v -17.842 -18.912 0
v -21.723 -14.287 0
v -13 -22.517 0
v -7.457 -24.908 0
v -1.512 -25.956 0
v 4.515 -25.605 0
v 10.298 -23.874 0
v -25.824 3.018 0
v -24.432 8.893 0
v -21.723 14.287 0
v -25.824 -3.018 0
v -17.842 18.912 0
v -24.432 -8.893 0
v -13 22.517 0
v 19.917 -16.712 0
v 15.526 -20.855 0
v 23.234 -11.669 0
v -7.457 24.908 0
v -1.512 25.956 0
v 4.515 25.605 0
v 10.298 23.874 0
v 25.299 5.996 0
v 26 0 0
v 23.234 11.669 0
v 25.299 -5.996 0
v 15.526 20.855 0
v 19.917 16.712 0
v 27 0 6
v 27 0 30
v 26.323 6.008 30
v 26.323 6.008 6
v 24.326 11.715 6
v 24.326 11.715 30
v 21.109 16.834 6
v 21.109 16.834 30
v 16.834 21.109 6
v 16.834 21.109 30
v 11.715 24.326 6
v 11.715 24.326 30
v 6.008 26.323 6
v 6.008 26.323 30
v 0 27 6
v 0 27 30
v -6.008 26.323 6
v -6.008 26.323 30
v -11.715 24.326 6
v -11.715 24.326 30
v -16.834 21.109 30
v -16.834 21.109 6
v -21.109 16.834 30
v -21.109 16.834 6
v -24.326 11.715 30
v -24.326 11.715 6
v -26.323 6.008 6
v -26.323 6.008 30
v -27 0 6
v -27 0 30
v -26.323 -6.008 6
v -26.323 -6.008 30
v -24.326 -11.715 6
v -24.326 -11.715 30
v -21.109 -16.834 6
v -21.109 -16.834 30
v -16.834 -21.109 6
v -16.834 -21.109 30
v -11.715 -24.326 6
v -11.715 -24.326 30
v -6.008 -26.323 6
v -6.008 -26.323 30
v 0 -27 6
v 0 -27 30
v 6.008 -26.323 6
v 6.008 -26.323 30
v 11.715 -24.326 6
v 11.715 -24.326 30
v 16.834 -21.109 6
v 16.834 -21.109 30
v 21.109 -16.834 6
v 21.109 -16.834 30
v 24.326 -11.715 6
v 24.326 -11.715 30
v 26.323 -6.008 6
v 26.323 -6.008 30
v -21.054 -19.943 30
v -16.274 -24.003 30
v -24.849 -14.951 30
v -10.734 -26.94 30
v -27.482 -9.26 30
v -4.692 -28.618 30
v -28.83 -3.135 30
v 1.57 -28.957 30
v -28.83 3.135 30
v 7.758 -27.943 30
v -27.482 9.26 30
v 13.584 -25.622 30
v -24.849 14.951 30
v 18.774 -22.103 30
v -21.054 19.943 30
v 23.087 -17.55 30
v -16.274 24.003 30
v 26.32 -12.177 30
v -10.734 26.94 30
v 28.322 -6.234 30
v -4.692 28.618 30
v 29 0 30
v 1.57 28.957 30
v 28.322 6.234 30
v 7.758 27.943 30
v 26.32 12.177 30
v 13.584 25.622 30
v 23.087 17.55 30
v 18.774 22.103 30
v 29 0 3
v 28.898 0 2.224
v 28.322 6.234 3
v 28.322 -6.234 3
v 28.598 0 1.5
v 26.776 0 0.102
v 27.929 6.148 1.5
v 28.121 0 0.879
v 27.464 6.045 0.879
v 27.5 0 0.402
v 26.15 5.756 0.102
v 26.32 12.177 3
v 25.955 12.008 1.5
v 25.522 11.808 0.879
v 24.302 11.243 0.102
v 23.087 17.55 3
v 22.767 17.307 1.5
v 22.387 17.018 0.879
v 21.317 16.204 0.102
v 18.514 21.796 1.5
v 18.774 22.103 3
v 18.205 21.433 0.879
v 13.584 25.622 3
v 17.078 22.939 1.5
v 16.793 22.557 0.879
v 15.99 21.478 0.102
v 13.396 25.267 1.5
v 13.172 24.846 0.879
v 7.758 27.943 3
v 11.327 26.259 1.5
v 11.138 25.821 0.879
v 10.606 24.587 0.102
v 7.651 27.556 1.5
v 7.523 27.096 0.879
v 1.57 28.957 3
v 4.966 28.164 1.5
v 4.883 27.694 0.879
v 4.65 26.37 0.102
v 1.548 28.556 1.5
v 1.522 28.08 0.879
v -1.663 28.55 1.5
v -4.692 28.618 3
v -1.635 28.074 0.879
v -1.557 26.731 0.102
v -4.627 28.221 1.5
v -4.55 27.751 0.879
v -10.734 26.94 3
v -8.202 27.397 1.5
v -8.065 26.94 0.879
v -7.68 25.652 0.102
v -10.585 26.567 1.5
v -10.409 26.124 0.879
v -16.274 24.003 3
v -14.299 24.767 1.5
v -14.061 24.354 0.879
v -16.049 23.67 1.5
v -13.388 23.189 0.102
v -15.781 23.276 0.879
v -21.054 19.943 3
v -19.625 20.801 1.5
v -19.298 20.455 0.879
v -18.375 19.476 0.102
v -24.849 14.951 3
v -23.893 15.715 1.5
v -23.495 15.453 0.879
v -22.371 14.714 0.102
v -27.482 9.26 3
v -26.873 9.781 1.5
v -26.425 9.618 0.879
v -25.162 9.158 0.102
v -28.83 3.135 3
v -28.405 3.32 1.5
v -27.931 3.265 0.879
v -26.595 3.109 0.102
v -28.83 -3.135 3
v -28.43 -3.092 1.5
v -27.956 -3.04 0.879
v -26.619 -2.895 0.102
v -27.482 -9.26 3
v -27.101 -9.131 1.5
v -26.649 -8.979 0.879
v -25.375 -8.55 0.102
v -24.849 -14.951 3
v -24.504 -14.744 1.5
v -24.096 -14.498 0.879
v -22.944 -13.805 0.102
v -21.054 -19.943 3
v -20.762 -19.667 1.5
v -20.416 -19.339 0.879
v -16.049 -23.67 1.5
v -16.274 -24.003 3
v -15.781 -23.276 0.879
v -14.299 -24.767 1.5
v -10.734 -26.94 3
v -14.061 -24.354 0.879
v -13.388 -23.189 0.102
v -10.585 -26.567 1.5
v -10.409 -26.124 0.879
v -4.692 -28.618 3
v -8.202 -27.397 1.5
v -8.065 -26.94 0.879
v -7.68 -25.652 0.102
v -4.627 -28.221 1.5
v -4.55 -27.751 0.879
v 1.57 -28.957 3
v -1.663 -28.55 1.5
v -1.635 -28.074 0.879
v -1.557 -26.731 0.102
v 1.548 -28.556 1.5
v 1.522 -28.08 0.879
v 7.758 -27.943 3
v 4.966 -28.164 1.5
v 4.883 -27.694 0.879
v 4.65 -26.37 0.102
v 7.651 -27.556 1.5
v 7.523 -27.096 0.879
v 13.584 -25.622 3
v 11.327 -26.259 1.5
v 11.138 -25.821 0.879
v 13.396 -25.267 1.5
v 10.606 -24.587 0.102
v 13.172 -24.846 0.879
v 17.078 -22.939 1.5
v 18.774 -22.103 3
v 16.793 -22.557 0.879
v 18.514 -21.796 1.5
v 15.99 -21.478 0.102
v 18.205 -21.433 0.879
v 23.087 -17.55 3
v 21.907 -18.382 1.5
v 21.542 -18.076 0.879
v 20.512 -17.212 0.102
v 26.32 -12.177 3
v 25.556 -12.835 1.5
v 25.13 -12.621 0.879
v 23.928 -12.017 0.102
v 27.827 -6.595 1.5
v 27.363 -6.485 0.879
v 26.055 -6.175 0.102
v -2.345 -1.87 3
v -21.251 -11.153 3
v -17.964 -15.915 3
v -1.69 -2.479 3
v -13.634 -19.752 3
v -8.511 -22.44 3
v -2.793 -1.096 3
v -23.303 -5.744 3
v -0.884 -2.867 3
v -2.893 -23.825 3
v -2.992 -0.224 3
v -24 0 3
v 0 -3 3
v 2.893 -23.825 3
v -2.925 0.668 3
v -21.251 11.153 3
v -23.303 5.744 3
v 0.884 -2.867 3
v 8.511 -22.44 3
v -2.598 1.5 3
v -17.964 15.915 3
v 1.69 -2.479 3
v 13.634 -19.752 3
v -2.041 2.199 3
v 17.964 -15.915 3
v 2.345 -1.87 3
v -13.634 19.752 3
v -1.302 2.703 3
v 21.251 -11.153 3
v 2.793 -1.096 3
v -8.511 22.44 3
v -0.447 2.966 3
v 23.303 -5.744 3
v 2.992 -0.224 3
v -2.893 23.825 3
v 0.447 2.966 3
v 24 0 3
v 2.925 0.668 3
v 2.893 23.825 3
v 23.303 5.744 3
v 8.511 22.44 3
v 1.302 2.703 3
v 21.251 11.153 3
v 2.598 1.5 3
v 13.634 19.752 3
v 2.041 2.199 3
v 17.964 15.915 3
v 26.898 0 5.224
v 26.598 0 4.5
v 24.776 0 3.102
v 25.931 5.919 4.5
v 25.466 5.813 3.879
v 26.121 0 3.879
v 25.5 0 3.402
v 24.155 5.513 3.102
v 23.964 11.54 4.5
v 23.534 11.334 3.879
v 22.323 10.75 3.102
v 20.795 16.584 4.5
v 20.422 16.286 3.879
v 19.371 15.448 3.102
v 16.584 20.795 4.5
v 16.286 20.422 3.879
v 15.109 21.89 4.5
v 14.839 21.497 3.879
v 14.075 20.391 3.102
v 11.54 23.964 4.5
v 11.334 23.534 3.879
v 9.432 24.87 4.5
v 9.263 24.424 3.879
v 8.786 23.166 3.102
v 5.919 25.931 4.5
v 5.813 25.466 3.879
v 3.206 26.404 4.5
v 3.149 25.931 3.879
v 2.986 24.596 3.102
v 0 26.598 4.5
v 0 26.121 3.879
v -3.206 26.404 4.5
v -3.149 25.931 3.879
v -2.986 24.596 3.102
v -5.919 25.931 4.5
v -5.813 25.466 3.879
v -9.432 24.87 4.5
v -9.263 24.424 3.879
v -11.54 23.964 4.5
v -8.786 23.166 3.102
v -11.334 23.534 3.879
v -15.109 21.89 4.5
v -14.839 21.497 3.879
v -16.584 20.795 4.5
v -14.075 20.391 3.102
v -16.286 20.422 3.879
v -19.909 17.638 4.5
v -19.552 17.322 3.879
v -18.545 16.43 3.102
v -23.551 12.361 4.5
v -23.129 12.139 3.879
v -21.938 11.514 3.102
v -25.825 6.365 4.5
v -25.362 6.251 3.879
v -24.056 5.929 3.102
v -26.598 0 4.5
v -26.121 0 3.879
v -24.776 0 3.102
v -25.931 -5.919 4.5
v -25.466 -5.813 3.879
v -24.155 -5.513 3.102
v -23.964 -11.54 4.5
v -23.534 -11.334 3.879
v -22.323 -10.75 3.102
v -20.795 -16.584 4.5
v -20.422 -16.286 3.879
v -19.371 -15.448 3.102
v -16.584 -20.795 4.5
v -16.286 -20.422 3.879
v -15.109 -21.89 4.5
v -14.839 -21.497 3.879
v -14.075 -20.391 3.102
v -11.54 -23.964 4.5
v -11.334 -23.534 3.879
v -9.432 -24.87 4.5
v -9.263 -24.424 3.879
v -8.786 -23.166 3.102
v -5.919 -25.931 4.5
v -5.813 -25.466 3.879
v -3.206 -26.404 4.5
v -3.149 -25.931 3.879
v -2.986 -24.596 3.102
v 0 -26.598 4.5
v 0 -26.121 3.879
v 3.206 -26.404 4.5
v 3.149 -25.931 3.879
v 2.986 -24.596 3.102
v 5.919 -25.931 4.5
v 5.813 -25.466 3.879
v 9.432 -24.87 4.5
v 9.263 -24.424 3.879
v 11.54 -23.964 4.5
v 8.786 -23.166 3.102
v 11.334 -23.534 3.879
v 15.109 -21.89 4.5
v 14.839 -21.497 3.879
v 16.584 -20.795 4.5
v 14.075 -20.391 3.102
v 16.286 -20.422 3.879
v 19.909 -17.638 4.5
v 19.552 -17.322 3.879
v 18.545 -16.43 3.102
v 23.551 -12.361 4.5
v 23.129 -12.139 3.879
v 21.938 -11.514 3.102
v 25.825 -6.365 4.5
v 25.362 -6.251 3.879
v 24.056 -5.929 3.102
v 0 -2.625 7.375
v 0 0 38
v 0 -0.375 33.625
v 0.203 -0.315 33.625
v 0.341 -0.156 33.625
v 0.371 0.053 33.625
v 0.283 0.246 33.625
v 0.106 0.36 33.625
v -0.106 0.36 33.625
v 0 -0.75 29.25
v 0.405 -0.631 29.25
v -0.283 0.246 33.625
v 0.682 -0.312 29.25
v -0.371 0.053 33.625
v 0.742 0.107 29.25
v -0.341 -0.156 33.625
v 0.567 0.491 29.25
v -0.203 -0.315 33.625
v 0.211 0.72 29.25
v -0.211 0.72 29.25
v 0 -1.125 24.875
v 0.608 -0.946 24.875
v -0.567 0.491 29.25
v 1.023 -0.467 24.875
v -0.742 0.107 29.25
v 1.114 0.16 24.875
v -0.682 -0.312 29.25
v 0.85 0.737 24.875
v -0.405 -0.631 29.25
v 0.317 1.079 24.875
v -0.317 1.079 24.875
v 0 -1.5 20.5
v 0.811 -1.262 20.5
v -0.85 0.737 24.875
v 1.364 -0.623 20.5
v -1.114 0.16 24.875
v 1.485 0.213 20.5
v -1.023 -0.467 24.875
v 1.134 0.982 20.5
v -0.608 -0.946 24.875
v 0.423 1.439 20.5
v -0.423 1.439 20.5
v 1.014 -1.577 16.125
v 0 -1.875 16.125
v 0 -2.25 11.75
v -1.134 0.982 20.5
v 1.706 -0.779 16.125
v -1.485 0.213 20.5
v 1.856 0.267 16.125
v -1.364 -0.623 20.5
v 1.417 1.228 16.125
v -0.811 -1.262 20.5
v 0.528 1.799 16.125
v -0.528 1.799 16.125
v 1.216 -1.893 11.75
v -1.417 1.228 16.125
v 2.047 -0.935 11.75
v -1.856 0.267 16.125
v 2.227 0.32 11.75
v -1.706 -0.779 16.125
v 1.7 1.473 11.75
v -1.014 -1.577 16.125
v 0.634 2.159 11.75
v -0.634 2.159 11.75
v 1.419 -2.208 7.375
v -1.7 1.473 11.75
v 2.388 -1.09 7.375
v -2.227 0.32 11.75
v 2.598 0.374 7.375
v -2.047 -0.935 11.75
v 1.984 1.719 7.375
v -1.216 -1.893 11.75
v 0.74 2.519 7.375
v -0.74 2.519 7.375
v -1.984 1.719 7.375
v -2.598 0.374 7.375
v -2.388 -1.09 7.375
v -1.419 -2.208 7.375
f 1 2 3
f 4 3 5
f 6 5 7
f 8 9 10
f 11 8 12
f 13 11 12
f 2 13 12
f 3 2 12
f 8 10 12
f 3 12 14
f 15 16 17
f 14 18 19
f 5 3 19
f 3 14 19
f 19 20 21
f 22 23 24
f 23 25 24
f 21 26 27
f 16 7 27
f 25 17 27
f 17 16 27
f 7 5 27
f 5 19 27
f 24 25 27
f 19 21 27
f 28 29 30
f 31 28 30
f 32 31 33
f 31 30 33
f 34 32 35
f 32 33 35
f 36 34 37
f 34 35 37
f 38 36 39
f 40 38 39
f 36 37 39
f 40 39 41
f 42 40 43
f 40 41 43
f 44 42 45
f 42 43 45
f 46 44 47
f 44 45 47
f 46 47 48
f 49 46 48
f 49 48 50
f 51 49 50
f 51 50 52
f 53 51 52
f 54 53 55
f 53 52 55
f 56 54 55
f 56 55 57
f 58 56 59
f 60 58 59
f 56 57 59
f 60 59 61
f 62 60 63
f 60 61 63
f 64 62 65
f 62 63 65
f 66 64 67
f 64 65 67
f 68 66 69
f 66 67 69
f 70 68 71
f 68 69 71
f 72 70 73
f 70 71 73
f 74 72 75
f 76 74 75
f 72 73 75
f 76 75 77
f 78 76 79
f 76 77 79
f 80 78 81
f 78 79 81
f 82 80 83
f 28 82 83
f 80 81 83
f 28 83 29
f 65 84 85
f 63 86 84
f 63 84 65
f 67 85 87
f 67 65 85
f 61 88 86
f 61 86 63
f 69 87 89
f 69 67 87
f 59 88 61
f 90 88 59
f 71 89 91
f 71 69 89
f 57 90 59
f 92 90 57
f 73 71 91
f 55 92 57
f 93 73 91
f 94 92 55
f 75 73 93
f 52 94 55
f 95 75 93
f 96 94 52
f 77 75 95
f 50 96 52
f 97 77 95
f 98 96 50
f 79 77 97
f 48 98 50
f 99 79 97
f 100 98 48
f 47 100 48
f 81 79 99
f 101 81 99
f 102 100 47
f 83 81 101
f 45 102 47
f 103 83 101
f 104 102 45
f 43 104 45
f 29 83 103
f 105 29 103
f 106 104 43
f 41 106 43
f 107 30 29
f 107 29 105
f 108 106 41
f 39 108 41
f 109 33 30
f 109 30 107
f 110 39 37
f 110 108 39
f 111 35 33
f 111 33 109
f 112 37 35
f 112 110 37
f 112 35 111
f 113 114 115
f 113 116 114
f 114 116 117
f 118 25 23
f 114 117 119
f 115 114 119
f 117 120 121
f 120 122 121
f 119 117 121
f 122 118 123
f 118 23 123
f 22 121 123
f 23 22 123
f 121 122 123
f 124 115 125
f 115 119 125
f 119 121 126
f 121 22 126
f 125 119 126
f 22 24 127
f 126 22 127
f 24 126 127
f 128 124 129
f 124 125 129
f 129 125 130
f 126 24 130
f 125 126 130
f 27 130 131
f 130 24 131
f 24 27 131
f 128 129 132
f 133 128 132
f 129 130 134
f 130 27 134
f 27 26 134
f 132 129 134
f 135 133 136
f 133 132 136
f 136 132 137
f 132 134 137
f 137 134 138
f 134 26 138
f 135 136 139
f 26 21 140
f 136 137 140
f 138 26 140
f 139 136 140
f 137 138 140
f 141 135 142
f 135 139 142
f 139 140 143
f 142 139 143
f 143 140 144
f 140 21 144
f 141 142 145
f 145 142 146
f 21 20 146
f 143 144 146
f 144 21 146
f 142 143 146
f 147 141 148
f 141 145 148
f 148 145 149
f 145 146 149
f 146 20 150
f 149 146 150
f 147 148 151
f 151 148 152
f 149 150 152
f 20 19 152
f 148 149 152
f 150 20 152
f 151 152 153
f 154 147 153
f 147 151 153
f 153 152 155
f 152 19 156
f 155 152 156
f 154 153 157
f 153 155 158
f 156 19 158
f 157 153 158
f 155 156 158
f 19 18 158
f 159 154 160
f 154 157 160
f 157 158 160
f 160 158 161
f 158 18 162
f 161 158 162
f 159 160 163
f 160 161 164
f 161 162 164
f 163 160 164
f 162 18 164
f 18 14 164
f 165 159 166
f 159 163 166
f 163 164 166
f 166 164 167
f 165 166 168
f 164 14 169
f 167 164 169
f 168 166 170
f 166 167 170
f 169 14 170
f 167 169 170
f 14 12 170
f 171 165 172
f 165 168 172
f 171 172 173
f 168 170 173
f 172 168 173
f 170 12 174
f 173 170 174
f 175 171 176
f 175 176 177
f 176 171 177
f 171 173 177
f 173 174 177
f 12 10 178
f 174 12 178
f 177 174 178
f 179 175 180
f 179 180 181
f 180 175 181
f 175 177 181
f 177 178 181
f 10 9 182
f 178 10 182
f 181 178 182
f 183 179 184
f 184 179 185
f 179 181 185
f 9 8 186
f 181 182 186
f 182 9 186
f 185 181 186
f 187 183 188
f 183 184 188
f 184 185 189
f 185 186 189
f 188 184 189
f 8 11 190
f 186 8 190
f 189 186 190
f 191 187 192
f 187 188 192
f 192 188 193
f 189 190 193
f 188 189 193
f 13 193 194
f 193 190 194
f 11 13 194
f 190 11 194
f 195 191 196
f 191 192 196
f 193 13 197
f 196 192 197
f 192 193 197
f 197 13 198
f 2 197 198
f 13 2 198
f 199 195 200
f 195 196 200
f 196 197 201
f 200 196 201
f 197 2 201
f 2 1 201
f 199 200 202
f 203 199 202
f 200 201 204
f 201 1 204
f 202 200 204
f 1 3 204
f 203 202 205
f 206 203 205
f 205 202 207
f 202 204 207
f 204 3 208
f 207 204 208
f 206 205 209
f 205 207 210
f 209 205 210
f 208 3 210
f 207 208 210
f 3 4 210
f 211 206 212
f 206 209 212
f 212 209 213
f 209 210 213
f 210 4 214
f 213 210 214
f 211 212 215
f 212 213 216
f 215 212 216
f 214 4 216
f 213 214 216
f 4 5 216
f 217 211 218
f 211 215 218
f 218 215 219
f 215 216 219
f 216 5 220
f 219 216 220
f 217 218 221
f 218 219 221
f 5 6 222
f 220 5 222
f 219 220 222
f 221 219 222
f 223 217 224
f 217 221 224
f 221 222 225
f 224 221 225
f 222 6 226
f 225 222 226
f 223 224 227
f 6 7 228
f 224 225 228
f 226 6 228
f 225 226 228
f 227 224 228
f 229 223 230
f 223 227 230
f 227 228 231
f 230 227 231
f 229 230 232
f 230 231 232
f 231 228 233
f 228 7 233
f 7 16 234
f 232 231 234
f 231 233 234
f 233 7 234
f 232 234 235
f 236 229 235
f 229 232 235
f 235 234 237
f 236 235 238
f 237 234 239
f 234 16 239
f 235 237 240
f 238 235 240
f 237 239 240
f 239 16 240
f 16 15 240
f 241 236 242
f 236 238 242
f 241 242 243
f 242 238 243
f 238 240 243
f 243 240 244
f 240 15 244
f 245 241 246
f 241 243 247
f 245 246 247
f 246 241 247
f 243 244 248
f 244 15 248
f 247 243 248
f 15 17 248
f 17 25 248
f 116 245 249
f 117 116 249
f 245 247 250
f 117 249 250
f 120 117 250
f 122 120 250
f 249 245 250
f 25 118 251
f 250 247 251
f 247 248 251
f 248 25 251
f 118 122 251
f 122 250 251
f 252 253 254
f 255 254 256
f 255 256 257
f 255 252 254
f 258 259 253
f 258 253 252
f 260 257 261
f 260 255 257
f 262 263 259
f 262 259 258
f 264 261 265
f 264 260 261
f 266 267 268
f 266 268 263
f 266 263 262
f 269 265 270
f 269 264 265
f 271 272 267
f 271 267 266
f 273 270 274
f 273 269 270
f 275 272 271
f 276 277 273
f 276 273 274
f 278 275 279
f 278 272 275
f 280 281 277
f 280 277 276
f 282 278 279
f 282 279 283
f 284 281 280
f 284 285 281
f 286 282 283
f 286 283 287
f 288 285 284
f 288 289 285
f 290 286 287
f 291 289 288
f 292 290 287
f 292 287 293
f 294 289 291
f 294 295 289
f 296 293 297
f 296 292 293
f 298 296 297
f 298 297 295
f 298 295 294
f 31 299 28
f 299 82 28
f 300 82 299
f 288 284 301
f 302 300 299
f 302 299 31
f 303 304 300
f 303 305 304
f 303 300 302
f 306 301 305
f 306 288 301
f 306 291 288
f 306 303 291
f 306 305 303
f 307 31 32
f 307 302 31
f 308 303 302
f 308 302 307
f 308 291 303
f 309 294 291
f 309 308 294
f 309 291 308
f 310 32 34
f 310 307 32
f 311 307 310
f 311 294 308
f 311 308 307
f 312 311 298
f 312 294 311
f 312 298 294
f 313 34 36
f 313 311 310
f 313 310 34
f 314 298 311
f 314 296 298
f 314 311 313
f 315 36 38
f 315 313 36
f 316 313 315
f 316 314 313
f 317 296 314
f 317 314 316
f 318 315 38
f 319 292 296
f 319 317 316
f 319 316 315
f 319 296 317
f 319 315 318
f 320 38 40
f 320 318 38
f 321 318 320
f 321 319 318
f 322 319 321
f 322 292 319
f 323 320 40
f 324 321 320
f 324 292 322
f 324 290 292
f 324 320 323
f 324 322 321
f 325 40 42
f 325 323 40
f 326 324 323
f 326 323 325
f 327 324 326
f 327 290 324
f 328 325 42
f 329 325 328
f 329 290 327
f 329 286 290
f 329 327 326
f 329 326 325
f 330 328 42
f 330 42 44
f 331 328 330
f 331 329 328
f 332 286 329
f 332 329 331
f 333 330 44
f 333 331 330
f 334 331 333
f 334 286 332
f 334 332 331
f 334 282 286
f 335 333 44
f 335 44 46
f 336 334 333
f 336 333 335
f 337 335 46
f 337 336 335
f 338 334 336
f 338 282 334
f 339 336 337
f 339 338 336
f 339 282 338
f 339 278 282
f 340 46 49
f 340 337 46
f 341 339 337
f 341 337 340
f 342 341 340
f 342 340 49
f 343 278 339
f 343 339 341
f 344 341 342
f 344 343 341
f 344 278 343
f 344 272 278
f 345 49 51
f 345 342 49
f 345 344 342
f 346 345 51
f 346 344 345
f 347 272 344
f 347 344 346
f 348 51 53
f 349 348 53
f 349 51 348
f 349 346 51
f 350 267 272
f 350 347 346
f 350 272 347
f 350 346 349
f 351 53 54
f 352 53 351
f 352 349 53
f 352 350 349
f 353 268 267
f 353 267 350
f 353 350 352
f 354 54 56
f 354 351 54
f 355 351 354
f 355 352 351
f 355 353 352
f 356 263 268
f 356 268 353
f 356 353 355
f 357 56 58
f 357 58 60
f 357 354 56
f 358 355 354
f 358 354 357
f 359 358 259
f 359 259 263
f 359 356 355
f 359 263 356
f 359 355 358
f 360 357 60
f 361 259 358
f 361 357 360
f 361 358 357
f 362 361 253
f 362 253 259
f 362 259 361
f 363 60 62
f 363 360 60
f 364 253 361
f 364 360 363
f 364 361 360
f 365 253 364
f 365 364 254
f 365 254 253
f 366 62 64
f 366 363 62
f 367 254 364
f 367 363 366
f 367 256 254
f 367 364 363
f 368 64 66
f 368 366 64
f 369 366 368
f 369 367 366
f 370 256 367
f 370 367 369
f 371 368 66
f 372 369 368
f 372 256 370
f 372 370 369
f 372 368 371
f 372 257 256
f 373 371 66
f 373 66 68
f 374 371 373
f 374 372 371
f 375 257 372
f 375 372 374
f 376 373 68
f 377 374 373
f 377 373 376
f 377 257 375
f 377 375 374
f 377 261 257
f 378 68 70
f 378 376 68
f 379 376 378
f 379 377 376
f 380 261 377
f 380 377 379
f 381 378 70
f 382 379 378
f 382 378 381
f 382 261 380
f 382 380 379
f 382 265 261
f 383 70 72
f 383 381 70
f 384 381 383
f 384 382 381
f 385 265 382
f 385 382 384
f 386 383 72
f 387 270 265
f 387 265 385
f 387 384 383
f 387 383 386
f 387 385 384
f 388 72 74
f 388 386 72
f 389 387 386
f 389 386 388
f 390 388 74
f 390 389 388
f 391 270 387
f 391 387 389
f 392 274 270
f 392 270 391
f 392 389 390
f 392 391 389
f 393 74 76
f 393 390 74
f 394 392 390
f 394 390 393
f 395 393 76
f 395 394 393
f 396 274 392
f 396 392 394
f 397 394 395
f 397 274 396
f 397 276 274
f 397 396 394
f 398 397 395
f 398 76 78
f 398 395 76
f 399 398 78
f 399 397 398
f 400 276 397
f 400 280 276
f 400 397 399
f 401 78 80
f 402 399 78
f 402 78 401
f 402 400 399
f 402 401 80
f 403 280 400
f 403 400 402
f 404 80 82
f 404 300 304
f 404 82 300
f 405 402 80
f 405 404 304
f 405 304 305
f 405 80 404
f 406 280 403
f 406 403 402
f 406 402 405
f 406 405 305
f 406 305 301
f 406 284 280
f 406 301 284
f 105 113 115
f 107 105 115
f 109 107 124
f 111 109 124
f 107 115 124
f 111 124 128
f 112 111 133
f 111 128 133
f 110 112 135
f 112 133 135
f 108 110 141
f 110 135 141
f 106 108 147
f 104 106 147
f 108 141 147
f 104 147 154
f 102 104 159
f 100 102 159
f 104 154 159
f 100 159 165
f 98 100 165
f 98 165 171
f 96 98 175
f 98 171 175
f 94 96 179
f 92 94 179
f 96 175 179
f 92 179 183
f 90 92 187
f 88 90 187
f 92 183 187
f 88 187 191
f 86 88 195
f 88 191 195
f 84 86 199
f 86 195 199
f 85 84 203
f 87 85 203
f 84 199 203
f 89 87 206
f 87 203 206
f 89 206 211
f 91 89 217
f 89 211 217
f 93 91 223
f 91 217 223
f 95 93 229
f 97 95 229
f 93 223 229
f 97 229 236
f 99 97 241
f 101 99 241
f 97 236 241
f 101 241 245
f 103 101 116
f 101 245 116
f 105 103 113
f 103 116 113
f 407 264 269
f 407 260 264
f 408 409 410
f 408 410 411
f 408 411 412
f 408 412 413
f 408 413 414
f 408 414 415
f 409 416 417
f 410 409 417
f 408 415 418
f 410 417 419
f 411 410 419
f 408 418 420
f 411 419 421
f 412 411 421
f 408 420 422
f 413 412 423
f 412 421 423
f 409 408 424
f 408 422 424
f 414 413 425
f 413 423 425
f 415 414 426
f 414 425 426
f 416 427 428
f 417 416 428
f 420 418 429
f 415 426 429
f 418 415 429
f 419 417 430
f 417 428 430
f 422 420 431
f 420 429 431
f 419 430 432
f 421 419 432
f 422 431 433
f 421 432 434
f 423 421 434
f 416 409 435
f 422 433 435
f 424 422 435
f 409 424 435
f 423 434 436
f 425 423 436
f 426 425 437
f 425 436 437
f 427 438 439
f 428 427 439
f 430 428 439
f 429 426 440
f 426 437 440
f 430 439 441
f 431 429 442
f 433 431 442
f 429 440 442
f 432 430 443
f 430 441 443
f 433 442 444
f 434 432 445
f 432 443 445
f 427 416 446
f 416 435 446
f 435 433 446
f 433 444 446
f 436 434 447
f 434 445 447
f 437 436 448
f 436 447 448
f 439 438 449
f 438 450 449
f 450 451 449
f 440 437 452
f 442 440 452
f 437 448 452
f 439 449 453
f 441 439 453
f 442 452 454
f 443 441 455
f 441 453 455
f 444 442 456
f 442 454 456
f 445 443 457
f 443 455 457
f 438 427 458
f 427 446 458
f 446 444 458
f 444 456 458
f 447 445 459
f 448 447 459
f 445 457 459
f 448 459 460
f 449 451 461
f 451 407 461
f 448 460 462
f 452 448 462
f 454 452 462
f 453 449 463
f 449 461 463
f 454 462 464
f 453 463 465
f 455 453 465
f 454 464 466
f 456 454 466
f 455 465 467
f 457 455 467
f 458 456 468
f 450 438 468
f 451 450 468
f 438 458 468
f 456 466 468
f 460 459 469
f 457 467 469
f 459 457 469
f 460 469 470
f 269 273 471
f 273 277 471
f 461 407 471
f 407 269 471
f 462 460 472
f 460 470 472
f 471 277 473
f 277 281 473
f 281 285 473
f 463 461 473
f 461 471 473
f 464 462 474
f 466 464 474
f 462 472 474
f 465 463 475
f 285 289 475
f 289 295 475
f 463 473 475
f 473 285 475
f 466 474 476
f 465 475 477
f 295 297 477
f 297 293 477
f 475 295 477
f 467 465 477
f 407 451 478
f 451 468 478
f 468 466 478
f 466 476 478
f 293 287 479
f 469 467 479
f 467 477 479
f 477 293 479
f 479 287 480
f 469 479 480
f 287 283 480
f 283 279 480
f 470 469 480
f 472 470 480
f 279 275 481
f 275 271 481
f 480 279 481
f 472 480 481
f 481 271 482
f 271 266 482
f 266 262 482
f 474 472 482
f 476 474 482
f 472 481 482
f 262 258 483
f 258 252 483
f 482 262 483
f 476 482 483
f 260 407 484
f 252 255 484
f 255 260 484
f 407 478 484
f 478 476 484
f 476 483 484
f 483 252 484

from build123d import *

# Parameters (mm, degrees)
F0_R     = 29
F1_DEPTH = 30
F3_R     = 27
F4_DEPTH = 27
F5_R     = 3
F6_R     = 3


with BuildPart() as f1:
    # F0 (on Top) → F1 (new body)
    with BuildSketch(Plane.XY):
        Circle(F0_R)
    extrude(amount=F1_DEPTH)

    # F3 (on offset) → F4 (cut)
    with BuildSketch(Plane.XY.offset(30)):
        Circle(F3_R)
    extrude(amount=-F4_DEPTH, mode=Mode.SUBTRACT)

    # F5
    f5_edges = [f1.edges().sort_by_distance(p)[0] for p in [
        (-27, 0, 3),
    ]]
    fillet(f5_edges, radius=F5_R)

    # F6
    f6_edges = [f1.edges().sort_by_distance(p)[0] for p in [
        (-29, 0, 0),
    ]]
    fillet(f6_edges, radius=F6_R)

    # F7 (on Right) → F8 (revolve)
    with BuildSketch(Plane.YZ):
        Polygon((-3, 3), (0, 3), (0, 38), align=None)
    revolve(axis=Axis((0, 0, 20.5), (0, 0, 1)))


solid = f1.part
